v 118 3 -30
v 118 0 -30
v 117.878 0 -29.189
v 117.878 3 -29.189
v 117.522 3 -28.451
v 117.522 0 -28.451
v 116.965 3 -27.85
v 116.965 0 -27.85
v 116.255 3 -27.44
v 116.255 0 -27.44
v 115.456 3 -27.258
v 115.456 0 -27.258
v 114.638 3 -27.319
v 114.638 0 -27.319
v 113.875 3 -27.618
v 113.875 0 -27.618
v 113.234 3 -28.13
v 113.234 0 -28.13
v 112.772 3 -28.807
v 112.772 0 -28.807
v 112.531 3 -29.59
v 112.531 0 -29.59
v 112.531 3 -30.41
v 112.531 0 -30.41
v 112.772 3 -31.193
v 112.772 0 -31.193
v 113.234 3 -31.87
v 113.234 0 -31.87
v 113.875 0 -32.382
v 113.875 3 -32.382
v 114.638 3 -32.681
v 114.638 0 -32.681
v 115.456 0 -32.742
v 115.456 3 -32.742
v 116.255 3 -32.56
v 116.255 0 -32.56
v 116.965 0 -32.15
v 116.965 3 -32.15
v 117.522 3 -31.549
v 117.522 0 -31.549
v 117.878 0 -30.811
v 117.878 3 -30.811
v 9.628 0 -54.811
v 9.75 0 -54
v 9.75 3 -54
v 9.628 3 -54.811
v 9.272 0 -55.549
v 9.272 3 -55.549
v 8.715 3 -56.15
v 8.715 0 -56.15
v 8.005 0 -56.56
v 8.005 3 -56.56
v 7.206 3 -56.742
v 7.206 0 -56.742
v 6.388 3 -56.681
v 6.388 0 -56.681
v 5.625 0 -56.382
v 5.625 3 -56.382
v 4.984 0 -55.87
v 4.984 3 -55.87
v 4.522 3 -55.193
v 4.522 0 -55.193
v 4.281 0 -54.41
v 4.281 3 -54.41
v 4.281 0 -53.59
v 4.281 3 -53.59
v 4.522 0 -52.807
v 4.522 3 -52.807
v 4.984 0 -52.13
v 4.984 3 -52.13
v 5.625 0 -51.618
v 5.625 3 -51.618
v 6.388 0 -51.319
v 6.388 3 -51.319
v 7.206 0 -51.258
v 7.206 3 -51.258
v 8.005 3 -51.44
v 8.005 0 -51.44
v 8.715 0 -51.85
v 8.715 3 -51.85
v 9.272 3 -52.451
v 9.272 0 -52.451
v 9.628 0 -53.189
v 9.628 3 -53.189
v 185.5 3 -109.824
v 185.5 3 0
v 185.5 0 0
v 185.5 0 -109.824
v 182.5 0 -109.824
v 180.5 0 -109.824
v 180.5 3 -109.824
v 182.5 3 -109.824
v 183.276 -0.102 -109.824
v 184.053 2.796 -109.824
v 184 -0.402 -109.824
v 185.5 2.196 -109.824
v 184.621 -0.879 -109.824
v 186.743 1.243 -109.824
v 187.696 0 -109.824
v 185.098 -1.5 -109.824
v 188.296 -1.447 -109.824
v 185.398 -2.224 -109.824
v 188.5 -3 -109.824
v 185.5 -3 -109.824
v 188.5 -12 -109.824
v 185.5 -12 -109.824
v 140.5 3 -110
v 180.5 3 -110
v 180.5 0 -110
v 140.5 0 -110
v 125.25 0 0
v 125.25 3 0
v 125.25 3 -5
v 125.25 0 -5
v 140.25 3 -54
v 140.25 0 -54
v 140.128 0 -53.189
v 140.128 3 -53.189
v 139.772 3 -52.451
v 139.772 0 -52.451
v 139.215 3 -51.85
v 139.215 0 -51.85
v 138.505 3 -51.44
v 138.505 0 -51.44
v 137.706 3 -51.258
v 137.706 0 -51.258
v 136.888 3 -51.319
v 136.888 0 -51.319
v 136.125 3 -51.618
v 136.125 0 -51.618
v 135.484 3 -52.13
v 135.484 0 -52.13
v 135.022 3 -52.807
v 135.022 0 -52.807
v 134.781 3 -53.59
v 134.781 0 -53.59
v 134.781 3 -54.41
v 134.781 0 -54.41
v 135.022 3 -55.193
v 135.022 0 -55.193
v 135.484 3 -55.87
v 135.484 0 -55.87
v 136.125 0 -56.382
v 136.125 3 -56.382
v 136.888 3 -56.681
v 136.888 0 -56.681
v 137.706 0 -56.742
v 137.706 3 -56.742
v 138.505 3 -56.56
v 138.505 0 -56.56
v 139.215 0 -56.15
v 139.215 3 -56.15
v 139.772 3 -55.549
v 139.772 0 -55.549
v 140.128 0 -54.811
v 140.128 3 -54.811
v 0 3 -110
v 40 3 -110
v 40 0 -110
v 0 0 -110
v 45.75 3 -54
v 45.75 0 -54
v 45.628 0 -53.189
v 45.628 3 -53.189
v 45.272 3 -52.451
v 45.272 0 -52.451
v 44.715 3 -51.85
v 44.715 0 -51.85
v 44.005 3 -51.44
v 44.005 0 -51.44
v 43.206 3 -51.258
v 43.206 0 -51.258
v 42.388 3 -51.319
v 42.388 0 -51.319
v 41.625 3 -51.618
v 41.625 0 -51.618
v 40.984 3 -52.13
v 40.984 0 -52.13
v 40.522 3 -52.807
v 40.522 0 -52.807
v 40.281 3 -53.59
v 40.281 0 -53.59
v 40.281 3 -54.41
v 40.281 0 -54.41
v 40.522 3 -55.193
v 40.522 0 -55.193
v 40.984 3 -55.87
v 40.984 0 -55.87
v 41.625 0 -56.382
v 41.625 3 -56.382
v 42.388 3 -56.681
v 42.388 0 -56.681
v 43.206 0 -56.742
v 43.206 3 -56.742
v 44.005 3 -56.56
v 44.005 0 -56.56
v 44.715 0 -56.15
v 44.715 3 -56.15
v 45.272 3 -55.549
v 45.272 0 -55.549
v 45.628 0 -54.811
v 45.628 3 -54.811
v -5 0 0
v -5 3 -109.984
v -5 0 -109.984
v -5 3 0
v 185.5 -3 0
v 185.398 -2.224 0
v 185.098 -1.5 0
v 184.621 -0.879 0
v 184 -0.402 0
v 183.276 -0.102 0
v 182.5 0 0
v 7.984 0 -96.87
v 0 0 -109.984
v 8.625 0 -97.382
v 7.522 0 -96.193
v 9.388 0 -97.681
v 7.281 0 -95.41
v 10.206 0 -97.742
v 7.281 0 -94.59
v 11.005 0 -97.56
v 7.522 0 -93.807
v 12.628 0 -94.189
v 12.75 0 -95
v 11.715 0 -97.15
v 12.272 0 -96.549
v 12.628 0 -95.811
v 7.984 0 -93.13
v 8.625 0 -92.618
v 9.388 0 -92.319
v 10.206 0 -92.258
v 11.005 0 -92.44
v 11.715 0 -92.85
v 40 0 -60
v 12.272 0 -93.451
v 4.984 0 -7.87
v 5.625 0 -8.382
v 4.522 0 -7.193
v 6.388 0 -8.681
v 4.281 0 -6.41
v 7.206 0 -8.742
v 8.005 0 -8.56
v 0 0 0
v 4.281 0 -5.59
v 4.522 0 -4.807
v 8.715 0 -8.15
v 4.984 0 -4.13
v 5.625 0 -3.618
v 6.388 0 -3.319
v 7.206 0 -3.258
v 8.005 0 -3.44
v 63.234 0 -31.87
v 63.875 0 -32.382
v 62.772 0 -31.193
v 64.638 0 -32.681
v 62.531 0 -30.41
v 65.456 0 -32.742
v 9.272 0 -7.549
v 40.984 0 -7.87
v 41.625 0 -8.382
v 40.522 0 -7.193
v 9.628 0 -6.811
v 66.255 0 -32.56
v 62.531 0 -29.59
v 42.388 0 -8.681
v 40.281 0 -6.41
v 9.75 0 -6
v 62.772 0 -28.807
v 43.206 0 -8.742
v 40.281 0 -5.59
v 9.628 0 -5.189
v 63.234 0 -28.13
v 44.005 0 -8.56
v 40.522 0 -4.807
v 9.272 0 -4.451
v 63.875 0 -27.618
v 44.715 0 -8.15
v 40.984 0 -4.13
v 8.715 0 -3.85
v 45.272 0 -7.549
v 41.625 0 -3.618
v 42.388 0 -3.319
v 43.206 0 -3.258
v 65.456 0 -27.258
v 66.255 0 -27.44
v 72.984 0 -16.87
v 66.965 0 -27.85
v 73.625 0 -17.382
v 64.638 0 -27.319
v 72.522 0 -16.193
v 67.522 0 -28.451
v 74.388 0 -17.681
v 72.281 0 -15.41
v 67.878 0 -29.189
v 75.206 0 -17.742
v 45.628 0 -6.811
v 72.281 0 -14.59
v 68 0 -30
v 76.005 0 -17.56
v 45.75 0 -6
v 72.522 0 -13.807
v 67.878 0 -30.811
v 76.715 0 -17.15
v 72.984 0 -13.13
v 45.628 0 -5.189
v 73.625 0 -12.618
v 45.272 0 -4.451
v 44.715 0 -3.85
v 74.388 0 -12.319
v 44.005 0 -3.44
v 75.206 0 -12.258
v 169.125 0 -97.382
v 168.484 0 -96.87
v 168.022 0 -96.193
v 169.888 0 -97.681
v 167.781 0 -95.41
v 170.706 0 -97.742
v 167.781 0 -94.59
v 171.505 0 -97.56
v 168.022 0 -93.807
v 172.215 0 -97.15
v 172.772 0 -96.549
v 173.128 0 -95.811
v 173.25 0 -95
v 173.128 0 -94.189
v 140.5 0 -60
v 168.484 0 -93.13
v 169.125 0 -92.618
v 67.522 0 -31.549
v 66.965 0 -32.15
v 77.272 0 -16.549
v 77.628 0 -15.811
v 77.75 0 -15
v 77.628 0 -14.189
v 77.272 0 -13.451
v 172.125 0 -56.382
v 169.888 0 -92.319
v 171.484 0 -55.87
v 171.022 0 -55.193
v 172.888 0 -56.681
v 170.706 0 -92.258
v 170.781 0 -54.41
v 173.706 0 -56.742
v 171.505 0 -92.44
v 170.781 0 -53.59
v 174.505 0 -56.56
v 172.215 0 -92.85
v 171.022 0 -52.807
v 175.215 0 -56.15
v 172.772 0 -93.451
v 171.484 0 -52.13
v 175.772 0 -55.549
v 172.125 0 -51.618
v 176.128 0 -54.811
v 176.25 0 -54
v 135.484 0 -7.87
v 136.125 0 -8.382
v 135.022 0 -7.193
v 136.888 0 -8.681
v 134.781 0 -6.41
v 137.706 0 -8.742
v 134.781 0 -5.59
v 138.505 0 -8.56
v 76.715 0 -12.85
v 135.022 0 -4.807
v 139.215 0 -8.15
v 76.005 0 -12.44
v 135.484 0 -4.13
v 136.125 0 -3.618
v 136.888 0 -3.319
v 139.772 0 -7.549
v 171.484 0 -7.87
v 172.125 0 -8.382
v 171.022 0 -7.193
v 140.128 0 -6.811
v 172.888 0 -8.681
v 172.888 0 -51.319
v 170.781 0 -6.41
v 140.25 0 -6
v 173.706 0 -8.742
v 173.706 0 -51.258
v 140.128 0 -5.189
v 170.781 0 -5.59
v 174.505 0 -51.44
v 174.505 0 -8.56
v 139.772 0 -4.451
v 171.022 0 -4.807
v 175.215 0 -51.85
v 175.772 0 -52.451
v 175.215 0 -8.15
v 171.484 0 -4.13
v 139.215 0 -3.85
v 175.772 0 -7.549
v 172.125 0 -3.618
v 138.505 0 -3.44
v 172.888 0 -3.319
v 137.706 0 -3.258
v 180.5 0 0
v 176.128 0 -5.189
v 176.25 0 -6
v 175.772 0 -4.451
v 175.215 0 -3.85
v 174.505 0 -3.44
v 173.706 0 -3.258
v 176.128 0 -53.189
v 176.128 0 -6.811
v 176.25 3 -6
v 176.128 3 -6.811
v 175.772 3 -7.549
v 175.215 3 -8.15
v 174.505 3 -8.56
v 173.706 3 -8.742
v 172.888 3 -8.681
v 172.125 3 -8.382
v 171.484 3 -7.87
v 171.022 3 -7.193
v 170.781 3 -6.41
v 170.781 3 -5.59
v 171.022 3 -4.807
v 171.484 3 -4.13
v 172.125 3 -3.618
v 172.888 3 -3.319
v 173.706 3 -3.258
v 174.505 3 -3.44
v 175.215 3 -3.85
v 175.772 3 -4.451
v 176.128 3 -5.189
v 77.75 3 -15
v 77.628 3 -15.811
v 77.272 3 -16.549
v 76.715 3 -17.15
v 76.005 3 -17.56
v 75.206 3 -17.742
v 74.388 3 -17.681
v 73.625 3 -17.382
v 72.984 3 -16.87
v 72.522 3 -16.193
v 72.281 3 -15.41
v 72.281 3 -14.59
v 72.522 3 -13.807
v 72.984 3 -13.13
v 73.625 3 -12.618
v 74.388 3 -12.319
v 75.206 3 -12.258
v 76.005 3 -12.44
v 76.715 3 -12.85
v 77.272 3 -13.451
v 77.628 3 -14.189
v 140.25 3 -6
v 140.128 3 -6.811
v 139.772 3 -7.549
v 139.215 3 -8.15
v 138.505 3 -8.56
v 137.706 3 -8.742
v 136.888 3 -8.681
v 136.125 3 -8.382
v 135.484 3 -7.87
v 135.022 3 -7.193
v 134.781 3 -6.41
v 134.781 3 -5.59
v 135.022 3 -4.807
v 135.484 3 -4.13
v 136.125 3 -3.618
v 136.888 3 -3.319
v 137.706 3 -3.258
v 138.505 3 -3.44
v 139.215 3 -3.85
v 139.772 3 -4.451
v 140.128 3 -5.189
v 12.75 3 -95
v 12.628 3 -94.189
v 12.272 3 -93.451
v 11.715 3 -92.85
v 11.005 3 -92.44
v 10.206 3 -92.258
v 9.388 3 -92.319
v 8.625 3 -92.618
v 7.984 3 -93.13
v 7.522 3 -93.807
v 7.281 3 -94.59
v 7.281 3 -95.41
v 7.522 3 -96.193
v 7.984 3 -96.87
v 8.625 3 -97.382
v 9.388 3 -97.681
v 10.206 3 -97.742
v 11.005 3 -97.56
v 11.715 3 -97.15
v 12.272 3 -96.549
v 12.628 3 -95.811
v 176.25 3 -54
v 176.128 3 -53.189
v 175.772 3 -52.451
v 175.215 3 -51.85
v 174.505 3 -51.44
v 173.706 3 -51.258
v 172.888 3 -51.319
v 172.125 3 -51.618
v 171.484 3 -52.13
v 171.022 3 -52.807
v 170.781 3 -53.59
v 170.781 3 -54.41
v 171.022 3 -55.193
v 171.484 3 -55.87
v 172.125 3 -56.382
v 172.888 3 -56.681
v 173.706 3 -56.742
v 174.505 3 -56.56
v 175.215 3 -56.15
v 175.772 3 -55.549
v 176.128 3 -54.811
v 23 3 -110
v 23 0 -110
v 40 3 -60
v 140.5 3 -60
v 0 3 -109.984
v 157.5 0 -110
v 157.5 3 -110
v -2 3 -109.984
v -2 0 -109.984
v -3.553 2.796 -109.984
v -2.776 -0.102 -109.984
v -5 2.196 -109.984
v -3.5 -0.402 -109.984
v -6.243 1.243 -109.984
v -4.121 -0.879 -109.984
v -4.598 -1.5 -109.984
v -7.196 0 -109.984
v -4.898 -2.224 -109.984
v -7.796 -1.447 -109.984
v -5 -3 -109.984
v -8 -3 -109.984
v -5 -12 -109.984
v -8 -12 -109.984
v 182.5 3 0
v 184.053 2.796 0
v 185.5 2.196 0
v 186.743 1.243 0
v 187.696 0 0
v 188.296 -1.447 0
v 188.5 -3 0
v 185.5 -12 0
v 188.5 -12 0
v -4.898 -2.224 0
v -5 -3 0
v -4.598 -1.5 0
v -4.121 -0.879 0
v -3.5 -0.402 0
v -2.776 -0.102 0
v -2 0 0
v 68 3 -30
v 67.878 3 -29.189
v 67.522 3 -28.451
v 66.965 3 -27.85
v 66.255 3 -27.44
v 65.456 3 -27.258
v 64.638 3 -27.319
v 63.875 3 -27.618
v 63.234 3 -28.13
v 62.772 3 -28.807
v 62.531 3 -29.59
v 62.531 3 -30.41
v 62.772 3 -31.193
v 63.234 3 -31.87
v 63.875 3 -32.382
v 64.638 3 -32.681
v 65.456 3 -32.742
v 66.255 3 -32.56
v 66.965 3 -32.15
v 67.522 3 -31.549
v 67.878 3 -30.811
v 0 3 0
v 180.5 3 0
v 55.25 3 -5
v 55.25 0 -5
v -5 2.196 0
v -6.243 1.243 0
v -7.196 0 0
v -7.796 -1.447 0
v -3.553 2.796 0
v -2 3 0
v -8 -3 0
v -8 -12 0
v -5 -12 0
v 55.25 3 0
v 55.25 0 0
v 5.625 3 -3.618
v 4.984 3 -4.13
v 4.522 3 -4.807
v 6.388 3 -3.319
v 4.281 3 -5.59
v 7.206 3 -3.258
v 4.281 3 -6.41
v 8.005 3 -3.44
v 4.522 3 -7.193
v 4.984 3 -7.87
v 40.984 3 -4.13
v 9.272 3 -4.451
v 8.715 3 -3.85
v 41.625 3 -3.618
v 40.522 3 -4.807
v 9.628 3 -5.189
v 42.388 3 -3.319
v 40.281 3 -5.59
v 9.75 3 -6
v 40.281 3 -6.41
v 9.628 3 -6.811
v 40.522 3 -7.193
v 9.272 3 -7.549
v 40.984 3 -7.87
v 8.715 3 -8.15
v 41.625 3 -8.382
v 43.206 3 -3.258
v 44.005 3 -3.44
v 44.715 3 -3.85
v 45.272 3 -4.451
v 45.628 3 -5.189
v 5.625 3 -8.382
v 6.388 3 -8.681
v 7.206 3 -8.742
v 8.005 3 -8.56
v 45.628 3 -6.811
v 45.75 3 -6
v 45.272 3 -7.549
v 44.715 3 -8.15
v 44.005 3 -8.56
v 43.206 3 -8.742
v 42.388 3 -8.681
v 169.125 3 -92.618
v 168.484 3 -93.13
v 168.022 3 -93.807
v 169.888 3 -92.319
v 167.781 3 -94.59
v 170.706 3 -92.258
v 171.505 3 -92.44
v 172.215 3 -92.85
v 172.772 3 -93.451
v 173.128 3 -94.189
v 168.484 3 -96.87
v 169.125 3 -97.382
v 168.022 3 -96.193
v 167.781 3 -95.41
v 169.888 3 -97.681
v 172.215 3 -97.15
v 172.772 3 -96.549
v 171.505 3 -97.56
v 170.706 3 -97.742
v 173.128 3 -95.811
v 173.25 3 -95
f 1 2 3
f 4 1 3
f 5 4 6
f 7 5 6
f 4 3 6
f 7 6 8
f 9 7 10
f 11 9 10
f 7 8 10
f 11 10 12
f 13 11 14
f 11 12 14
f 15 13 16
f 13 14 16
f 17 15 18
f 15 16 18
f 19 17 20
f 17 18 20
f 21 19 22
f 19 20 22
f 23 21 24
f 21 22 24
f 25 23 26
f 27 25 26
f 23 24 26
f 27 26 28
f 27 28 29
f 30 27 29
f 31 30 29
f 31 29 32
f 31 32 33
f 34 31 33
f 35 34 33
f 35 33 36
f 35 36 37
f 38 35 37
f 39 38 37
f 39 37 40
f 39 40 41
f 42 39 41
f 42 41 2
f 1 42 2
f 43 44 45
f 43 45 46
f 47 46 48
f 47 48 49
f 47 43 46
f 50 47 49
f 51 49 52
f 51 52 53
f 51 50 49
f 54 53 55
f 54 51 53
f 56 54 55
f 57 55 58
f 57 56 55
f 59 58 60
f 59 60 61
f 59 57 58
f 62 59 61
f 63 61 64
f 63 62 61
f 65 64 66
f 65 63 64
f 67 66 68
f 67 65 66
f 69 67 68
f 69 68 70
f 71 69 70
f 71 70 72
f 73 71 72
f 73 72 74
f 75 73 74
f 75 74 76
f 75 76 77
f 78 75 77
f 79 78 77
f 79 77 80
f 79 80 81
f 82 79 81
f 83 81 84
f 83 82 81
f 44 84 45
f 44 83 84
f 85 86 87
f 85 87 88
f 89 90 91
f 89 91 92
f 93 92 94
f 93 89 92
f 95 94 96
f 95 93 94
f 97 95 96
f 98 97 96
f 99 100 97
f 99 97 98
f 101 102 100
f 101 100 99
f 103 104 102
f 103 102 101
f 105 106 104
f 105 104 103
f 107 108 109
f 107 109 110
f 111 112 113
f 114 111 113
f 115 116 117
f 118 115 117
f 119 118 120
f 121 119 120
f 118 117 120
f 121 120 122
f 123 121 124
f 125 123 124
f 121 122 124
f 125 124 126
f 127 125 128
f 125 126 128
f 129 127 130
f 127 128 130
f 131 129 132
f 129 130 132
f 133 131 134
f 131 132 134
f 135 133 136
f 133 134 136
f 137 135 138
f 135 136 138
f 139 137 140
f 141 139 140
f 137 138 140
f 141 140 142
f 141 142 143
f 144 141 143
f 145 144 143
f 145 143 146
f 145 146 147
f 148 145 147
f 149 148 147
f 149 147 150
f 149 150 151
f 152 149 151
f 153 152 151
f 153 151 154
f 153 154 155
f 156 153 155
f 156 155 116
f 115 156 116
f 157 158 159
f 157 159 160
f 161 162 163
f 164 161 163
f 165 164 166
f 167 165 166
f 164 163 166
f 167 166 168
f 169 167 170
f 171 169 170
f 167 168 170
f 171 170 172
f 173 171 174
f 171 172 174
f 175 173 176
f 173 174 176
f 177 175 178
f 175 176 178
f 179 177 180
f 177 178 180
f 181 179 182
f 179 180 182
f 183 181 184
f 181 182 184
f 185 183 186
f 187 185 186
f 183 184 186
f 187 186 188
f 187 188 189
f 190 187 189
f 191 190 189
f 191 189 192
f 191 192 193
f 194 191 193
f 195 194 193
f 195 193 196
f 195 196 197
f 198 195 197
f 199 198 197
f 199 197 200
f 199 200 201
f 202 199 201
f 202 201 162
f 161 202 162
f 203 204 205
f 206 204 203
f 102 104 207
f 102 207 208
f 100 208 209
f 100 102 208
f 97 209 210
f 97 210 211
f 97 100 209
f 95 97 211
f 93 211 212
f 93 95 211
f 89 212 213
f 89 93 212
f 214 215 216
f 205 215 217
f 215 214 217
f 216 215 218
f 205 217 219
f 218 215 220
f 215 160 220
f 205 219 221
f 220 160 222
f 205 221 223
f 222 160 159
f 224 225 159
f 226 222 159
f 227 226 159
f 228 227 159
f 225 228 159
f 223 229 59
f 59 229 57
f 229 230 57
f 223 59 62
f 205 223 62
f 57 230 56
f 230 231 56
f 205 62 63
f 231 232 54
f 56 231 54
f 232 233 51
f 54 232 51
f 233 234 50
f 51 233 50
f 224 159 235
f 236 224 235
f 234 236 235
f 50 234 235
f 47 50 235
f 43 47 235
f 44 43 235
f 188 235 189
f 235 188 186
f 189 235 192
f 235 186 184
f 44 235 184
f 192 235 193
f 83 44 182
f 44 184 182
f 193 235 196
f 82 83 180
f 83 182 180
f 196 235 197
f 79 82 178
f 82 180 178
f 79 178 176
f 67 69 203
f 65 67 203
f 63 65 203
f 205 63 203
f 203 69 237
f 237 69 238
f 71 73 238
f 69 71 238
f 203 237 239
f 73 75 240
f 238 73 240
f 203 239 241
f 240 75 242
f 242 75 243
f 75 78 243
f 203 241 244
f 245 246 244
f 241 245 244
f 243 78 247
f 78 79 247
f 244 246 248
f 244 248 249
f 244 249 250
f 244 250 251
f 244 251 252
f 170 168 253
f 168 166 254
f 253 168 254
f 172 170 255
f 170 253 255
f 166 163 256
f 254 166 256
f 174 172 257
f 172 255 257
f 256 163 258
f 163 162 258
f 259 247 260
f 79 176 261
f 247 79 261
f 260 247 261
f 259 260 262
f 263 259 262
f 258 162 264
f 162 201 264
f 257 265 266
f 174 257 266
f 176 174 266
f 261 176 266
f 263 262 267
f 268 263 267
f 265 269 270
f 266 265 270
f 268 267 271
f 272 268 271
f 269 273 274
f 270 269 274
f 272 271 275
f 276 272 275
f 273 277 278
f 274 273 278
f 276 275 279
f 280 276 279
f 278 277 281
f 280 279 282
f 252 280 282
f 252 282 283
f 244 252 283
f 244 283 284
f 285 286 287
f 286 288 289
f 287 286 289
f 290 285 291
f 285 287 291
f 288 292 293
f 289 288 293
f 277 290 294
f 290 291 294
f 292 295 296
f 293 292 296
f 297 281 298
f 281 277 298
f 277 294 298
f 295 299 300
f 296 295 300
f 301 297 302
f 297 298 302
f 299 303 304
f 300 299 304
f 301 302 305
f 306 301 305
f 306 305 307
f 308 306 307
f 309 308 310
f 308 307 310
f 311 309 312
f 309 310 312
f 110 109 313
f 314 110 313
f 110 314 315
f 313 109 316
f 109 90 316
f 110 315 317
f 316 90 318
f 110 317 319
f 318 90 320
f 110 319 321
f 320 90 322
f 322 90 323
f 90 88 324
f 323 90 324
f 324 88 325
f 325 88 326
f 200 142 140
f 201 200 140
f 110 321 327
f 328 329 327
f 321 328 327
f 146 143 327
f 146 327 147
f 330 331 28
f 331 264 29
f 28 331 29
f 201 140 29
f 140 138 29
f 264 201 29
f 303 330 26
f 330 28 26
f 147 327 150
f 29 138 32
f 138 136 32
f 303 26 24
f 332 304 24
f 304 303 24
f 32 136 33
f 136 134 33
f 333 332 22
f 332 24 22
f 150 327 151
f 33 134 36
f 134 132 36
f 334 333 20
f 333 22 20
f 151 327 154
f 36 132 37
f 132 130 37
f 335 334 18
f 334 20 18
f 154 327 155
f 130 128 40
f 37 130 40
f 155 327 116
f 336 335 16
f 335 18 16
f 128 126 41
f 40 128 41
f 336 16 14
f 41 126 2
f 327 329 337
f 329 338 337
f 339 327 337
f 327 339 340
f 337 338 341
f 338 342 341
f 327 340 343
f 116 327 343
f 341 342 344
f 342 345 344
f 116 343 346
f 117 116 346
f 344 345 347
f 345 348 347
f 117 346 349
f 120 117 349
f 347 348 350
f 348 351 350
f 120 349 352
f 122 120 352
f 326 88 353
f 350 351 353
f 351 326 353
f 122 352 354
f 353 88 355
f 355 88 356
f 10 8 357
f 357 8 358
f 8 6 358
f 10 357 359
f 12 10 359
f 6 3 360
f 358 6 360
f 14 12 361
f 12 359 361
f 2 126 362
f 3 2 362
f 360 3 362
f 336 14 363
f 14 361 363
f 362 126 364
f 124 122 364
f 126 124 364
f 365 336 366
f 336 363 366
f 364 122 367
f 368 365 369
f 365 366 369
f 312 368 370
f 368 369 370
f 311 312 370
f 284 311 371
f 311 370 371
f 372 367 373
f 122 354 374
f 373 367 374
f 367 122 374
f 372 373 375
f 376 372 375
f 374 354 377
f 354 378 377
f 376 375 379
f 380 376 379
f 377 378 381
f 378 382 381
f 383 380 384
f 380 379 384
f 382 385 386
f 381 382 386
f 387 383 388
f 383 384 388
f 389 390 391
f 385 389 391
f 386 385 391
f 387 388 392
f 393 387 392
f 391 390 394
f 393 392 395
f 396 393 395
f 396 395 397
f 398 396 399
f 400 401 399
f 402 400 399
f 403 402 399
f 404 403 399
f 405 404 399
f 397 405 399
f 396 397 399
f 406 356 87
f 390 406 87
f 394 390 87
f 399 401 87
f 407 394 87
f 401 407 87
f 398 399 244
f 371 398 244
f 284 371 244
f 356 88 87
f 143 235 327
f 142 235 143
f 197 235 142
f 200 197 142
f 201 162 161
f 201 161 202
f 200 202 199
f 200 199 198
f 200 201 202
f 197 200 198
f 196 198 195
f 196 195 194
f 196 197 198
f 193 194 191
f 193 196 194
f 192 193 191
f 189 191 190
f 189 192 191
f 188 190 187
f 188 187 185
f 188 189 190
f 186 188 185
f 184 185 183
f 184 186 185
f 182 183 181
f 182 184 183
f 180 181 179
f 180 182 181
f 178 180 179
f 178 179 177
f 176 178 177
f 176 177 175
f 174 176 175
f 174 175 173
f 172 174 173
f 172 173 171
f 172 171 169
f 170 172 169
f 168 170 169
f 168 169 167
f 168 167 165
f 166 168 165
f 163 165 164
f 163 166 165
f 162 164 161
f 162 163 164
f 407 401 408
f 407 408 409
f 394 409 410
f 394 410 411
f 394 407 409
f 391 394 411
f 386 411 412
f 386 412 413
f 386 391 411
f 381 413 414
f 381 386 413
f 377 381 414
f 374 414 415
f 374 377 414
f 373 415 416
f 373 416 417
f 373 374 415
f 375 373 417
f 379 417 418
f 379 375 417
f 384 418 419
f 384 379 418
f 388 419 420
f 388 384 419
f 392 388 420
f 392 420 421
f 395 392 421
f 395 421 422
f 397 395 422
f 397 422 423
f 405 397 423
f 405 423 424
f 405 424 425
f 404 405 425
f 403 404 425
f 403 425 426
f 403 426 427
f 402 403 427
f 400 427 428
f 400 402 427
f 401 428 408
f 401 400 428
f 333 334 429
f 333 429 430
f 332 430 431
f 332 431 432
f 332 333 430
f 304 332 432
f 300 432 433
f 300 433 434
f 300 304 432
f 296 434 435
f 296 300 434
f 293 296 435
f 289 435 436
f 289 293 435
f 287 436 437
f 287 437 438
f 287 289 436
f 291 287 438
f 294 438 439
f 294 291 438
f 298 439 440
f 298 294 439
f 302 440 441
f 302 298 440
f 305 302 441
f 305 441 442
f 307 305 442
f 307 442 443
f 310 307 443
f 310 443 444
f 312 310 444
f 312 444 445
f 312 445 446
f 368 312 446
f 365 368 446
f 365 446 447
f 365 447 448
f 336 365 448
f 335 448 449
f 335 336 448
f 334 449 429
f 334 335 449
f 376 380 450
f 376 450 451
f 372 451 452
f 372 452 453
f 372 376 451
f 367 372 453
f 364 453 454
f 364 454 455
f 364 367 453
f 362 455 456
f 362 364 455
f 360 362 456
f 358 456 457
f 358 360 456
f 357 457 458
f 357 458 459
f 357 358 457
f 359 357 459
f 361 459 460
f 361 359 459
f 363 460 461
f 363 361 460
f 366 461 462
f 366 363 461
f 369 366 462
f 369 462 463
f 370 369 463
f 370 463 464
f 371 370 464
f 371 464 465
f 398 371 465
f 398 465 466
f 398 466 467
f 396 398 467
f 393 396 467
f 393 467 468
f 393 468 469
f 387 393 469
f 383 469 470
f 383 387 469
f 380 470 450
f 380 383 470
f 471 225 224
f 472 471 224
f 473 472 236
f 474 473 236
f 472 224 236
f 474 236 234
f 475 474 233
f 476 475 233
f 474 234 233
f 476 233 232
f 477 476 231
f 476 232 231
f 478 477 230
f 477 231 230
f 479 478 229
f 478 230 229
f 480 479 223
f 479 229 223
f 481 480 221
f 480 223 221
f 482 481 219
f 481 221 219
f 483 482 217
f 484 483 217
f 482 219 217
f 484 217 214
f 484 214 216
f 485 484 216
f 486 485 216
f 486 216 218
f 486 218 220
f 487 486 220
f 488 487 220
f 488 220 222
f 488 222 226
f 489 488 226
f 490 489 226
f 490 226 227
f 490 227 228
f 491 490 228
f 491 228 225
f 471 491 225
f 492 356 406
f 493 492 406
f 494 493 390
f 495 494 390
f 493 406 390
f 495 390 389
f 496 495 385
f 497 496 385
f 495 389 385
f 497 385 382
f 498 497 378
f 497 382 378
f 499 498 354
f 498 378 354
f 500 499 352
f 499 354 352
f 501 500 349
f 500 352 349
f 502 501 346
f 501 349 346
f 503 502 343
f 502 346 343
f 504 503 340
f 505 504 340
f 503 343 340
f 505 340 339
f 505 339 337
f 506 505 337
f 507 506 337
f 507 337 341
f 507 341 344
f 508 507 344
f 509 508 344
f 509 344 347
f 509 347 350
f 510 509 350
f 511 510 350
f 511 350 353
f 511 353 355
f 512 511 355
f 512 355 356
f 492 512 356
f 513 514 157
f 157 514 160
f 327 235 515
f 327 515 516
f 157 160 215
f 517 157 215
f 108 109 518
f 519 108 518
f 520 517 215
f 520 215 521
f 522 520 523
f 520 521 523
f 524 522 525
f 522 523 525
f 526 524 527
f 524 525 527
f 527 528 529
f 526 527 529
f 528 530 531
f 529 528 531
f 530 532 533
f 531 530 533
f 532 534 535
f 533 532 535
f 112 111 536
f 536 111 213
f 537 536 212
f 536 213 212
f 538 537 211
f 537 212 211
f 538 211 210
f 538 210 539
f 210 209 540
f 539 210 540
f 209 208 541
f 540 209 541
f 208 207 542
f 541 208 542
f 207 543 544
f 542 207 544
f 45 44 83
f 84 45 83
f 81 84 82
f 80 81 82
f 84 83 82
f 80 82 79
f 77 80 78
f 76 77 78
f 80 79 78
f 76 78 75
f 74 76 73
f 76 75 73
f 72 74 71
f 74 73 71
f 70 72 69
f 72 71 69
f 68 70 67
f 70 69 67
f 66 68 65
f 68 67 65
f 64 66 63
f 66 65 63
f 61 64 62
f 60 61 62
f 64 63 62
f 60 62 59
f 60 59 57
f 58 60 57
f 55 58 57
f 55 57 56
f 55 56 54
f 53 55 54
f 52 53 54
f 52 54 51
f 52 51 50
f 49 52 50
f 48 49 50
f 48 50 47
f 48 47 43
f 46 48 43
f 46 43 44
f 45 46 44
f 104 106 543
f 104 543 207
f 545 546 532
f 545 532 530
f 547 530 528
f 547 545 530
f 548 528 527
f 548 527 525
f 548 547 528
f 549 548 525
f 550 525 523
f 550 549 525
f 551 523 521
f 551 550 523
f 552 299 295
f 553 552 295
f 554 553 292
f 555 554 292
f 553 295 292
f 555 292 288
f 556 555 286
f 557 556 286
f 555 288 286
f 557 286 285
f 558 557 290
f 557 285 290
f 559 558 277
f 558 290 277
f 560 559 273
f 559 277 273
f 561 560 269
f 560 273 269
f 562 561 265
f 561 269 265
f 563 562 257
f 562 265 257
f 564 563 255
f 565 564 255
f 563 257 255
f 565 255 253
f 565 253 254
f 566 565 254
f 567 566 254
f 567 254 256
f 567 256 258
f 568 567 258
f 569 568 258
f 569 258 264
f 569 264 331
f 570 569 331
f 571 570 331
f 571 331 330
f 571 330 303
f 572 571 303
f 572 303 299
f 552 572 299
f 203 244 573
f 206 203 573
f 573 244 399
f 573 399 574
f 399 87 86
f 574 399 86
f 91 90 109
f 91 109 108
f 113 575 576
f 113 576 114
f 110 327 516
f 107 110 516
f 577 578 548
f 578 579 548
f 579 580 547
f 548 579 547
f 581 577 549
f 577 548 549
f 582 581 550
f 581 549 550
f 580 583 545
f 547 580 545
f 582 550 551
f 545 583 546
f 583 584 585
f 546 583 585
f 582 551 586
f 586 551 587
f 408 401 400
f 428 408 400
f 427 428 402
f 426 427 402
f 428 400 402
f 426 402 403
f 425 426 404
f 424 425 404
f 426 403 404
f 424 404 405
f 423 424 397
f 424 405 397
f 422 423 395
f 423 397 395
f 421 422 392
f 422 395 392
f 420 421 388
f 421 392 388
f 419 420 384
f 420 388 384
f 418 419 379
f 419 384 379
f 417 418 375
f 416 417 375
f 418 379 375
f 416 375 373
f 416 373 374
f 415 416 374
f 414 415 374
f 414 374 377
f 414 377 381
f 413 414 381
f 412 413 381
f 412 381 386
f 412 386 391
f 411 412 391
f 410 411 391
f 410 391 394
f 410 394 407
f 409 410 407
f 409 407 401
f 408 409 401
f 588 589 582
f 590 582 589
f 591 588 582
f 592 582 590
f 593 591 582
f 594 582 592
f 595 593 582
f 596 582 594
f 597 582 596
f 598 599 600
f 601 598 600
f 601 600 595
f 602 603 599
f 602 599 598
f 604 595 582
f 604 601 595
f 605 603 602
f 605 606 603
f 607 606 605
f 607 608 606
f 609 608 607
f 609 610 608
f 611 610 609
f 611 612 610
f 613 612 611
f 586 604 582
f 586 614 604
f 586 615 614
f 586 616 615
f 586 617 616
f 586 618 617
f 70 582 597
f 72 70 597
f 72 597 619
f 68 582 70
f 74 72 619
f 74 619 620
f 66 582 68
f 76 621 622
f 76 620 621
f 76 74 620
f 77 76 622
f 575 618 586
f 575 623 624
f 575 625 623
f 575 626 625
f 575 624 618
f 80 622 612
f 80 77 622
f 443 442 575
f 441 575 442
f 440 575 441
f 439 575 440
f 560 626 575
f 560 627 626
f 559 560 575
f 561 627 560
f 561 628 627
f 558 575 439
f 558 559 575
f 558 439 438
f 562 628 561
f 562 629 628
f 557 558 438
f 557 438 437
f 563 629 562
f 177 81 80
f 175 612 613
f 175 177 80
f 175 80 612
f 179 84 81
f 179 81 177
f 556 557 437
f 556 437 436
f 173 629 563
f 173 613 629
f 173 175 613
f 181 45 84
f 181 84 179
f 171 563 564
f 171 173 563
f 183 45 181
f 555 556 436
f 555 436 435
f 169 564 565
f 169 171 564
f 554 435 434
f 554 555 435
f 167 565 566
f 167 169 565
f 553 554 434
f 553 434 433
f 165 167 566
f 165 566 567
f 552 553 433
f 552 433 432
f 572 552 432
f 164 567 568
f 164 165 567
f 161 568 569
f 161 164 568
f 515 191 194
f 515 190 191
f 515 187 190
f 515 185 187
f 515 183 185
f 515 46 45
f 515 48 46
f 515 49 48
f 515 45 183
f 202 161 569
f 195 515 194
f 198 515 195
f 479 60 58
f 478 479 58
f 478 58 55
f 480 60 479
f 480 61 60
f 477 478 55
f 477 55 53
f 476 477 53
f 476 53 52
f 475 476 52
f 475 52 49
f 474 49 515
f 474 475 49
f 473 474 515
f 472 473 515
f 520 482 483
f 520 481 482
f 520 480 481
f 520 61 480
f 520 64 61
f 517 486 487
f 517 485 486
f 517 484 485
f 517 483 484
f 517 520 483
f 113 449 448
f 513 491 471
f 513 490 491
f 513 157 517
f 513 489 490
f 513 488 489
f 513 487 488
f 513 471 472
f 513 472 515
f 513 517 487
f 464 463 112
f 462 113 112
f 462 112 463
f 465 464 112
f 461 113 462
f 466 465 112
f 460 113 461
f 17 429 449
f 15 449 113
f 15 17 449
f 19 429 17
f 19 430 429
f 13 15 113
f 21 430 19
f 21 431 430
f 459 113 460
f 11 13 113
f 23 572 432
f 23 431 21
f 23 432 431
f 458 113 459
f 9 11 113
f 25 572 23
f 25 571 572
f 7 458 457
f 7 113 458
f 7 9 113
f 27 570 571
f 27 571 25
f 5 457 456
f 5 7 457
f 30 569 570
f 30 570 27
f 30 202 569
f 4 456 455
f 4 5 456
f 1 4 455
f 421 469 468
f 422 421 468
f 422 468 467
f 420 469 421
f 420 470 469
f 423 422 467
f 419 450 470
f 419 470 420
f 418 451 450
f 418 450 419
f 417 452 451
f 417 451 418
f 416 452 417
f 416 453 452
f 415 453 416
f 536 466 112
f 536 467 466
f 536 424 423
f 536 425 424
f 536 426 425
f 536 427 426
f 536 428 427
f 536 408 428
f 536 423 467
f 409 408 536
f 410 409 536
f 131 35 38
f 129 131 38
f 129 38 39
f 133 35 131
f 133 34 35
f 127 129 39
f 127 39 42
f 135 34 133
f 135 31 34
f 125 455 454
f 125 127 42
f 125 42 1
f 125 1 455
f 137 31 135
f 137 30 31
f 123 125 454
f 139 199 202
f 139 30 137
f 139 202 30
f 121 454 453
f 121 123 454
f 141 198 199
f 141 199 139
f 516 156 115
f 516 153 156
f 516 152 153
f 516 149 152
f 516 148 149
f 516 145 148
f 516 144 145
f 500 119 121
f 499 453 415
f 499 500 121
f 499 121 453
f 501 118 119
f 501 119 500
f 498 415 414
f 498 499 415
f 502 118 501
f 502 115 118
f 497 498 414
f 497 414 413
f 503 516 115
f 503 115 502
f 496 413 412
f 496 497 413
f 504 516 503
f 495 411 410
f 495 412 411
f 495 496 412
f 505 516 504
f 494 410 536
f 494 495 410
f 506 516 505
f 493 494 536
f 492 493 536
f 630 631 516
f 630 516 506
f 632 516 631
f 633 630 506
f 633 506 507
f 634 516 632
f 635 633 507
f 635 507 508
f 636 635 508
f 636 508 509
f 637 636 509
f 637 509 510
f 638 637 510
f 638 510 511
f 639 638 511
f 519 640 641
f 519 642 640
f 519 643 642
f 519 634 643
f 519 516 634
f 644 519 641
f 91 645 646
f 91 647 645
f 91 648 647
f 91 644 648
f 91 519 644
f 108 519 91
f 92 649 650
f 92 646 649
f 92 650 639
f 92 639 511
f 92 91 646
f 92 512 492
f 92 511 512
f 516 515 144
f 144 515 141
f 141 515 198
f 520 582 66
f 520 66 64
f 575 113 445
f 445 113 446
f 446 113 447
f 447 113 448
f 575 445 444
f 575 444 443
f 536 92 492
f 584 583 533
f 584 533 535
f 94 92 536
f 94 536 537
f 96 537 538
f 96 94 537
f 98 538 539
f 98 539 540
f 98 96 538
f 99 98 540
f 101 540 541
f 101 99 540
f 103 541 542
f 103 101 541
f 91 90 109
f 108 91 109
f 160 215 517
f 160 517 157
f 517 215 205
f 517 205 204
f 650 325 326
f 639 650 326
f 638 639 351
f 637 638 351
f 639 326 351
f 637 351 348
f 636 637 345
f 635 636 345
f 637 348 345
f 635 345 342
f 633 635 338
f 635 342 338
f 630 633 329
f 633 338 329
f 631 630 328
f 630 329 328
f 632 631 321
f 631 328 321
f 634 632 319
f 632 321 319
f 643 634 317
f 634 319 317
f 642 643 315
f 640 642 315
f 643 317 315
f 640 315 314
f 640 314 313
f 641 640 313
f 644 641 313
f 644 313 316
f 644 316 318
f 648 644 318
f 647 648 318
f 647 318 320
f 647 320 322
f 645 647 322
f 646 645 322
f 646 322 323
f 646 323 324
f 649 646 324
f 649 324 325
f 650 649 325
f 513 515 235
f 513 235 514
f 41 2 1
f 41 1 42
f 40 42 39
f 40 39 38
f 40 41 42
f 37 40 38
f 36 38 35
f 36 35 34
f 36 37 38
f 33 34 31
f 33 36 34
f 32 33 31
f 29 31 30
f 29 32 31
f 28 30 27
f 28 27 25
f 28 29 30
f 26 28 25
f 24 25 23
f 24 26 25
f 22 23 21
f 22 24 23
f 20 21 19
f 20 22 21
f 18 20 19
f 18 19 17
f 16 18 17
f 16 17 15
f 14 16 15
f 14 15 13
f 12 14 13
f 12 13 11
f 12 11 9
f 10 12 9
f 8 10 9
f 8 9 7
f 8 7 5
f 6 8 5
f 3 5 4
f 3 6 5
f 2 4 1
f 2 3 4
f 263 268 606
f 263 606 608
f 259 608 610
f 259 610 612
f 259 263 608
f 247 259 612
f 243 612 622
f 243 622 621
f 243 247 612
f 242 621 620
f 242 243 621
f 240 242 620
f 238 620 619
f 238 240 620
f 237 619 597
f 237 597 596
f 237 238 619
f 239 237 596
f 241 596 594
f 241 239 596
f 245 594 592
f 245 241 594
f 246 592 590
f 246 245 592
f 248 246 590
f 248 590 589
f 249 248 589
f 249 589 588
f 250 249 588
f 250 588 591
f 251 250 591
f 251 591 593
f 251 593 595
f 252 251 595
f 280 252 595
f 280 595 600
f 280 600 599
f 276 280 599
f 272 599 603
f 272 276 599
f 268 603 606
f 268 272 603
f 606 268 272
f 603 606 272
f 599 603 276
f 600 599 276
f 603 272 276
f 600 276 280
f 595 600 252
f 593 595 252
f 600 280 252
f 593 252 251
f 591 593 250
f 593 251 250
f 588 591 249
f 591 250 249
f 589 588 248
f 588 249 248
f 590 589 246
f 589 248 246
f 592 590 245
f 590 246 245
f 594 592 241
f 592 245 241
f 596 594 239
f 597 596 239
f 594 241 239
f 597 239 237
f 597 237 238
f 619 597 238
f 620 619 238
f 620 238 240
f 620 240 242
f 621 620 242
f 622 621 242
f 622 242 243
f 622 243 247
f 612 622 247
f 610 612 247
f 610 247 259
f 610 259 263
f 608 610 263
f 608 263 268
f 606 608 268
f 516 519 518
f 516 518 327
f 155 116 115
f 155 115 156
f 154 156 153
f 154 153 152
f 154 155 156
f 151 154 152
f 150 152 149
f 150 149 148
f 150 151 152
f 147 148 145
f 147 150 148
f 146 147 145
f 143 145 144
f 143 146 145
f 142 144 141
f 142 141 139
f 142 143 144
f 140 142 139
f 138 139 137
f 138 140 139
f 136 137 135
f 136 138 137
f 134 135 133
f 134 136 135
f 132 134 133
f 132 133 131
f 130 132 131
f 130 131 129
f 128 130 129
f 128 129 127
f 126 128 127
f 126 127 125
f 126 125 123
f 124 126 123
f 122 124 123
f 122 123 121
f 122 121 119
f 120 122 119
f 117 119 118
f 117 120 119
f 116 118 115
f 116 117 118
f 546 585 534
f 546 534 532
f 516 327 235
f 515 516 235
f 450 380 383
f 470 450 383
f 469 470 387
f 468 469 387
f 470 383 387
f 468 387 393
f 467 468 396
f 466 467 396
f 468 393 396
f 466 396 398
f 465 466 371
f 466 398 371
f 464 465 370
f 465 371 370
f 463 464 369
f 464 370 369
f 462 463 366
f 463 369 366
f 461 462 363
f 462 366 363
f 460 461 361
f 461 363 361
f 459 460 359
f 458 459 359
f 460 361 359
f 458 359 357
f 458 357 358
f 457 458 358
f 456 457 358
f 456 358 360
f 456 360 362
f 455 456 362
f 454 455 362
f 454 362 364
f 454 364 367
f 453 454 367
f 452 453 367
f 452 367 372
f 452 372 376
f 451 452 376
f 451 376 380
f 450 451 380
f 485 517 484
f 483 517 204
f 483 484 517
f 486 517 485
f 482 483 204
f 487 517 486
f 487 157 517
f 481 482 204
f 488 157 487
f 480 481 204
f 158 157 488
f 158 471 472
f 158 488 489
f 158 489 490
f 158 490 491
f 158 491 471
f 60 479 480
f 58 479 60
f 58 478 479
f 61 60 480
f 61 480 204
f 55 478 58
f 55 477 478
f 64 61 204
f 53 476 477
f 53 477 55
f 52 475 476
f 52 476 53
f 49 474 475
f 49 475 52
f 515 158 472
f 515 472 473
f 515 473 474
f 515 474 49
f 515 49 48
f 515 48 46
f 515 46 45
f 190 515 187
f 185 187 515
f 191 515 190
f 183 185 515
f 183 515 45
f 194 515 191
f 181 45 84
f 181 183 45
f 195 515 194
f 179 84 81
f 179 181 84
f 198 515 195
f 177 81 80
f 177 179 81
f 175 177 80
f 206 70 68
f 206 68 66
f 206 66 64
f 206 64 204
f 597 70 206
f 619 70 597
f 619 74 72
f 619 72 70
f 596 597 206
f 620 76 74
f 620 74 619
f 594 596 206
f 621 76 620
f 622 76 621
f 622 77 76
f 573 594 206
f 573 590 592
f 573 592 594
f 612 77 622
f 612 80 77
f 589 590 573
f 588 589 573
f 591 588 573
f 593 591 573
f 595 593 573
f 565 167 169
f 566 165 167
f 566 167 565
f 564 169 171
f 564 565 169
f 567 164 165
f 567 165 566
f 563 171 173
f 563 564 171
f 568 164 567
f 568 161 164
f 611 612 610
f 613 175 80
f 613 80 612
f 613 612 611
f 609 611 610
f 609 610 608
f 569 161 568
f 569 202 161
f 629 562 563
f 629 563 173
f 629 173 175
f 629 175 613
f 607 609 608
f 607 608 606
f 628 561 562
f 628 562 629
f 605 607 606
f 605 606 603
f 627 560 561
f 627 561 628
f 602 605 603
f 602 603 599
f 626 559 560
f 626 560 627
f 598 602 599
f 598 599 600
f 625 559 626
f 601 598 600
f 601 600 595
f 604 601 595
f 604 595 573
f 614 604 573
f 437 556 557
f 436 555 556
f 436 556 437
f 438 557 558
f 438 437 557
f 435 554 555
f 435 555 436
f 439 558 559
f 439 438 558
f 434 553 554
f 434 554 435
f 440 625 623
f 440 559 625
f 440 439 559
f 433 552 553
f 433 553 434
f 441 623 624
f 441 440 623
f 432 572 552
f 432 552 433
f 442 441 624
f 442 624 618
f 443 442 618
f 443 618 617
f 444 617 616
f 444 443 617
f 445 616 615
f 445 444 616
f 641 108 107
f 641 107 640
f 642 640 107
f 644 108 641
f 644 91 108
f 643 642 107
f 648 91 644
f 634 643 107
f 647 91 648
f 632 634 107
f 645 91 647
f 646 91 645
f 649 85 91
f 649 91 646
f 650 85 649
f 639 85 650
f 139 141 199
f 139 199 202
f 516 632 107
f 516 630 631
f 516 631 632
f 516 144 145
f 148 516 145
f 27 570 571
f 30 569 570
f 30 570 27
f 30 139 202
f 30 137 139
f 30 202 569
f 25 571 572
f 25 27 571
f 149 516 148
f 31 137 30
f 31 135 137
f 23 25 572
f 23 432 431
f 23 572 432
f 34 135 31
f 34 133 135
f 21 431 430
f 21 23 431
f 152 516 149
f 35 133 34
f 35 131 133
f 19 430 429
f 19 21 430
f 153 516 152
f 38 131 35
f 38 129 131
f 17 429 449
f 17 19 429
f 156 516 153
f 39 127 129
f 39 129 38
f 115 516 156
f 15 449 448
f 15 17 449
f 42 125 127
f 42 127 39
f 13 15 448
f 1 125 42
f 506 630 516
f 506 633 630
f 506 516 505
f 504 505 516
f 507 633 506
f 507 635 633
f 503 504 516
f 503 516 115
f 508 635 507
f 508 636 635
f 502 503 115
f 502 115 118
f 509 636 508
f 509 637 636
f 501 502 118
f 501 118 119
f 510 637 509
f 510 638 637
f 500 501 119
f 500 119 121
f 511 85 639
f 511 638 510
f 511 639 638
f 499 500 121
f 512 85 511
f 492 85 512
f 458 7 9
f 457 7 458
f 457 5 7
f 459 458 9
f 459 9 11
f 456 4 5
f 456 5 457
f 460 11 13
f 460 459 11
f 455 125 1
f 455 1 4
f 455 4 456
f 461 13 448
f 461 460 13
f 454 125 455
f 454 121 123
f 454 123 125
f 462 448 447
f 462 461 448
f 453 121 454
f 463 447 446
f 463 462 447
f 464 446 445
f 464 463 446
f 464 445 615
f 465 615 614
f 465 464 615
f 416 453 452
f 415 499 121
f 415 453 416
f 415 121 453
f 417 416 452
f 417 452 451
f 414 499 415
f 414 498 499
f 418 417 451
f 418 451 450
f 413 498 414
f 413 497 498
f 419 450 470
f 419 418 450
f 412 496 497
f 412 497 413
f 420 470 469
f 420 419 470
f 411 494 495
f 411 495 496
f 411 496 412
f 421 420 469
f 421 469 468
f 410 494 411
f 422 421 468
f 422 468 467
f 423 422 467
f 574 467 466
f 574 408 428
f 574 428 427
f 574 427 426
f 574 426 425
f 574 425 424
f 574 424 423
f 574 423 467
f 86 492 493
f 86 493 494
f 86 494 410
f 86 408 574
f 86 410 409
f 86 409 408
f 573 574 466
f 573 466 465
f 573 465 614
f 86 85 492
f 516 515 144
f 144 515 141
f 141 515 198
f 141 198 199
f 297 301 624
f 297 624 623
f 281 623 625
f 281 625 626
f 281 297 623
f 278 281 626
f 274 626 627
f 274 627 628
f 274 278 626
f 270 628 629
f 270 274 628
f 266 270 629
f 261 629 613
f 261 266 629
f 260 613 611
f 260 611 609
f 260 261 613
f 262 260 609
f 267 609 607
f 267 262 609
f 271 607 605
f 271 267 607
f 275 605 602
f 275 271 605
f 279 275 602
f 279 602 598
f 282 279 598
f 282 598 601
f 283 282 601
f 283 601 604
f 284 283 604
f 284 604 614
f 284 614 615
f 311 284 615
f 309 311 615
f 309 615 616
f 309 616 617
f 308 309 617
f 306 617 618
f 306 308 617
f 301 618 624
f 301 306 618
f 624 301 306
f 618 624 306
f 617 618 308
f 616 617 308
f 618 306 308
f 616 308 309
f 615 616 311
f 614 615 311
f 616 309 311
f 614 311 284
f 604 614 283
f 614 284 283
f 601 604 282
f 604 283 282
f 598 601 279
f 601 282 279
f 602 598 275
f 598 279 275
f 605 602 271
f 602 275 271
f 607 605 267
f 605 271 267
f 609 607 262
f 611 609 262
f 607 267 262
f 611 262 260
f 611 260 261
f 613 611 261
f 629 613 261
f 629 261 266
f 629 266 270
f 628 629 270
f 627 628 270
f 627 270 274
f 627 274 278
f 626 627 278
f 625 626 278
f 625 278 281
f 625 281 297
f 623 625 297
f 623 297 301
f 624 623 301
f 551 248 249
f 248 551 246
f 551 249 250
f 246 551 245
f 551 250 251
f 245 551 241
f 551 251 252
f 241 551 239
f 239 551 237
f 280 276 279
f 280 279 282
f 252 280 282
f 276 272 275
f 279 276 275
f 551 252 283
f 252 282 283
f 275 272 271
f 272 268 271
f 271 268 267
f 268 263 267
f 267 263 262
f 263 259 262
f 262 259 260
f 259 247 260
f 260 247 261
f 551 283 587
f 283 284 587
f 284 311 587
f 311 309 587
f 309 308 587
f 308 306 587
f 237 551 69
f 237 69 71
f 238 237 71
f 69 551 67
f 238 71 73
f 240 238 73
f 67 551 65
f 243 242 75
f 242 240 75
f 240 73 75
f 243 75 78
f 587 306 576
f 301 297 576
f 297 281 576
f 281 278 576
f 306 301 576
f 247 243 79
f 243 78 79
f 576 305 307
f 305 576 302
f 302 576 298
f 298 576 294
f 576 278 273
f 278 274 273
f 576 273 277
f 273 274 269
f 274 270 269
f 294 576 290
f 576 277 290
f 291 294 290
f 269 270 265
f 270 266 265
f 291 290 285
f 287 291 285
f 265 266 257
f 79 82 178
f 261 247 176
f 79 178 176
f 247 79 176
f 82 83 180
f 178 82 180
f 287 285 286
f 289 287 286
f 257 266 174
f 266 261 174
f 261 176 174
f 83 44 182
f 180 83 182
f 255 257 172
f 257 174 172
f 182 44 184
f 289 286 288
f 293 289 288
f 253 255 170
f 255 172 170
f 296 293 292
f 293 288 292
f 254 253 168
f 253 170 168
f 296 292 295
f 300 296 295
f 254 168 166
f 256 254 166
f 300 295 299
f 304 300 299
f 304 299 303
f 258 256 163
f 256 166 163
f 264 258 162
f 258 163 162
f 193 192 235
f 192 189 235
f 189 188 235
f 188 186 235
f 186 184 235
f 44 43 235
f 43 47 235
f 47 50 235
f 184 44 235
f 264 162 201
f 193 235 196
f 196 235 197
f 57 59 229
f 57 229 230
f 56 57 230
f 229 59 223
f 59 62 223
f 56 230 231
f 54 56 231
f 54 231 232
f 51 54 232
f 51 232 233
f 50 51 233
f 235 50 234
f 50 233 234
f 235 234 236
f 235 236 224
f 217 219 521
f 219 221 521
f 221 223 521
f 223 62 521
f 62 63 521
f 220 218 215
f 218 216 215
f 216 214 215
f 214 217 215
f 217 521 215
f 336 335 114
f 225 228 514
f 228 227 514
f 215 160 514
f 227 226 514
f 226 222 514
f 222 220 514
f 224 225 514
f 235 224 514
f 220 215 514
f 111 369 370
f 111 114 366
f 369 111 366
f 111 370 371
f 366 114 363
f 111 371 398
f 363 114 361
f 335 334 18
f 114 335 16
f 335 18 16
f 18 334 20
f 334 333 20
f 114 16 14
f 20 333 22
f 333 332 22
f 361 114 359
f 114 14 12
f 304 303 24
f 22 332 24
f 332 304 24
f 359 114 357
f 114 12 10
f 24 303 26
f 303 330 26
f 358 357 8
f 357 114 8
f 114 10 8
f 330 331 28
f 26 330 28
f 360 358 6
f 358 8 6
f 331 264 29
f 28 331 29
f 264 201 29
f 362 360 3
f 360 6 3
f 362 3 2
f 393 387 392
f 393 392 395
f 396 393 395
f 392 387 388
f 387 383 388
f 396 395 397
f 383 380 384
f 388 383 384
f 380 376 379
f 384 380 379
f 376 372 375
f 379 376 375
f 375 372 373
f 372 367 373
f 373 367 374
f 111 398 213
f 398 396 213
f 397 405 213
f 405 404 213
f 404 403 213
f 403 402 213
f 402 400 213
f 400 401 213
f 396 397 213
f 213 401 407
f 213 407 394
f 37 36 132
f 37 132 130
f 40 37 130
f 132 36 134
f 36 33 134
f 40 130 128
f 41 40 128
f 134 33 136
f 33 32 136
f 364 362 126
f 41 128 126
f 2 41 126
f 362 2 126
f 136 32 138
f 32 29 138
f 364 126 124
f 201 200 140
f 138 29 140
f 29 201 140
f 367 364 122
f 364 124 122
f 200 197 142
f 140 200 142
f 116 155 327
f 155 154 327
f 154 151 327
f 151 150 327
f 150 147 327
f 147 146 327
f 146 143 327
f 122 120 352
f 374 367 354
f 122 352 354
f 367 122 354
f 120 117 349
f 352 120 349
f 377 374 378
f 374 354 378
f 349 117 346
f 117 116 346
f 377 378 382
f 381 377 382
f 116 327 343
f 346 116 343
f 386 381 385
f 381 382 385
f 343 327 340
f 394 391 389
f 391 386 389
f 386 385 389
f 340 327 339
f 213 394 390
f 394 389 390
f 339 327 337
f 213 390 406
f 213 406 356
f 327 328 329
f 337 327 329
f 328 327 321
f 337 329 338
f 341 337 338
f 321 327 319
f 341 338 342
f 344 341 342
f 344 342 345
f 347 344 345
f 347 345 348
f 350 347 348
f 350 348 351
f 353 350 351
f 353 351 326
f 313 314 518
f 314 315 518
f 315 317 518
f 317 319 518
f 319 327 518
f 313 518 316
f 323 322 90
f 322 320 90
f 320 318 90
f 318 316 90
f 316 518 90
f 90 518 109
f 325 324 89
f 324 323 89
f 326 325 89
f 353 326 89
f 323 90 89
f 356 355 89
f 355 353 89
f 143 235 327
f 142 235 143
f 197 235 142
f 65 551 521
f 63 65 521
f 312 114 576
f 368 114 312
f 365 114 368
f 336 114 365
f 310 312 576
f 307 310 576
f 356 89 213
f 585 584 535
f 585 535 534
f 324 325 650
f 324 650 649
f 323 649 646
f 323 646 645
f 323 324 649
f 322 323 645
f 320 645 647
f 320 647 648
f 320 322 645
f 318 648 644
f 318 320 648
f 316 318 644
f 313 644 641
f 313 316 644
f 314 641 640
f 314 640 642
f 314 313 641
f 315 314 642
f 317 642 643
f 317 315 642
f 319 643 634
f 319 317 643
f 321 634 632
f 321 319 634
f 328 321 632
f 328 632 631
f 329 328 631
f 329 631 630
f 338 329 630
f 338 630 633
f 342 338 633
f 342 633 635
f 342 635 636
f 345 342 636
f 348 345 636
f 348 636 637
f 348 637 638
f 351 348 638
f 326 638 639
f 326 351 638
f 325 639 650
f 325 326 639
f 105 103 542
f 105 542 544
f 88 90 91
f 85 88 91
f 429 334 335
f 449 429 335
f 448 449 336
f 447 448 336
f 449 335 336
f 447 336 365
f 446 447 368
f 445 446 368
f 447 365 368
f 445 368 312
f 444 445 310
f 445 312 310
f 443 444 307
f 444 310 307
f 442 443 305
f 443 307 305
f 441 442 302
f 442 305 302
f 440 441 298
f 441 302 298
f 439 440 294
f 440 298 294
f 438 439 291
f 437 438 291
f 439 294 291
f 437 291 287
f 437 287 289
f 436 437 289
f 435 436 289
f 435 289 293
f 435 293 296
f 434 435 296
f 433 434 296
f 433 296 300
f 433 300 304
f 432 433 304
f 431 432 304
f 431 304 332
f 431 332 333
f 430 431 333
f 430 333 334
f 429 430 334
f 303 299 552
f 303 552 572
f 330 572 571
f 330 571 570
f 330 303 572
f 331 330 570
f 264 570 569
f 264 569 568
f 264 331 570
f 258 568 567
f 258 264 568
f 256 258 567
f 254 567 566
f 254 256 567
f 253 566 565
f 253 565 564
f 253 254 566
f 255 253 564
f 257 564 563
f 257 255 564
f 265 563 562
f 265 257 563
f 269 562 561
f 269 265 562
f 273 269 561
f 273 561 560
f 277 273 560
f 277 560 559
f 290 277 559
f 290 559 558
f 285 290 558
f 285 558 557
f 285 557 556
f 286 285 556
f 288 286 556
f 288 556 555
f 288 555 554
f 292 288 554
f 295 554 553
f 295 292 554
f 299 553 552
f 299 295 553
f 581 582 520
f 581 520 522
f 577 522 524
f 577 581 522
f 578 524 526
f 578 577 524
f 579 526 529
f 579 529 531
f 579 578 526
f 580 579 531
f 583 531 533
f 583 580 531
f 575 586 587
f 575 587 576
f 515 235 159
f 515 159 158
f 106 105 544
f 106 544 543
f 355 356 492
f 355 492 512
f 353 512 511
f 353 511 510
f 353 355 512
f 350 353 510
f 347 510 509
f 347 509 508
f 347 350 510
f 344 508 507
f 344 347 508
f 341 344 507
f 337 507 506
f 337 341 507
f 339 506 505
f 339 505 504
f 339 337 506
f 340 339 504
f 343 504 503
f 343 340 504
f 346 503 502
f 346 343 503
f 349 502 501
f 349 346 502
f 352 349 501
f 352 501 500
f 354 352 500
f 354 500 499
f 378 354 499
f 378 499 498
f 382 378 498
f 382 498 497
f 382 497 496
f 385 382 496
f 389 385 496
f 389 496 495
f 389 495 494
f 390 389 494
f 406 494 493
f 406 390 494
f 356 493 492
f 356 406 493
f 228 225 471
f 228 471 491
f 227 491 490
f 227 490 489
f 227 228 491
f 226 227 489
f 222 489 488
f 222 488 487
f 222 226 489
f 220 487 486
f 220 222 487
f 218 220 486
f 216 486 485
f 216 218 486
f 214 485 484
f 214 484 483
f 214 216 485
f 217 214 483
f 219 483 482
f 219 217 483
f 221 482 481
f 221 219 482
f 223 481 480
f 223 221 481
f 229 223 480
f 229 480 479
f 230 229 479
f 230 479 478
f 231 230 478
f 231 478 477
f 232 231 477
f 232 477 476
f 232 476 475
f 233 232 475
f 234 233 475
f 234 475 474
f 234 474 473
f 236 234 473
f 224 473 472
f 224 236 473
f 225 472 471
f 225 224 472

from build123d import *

# Parameters (mm, degrees)
SKETCH1_W                    = 180.5
SKETCH1_H                    = 60
BOSS_EXTRUDE1_DEPTH          = 3
F_5_5_5_5_DIAMETER_HOLE1_D   = 5.5
SKETCH4_W                    = 40
SKETCH4_H                    = 3
BOSS_EXTRUDE2_DEPTH          = 50
SKETCH5_W                    = 109.823812377
SKETCH5_H                    = 3
BOSS_EXTRUDE3_DEPTH          = 5
SKETCH6_W                    = 109.983538279
SKETCH6_H                    = 3
BOSS_EXTRUDE4_DEPTH          = 5
F_5_5_5_5_DIAMETER_HOLE2_D   = 5.5
CONVERT_SOLID2_OUTLINE_R     = 2.75
CONVERT_SOLID2_DEPTH         = 3
EDGE_FLANGE1_STRIP_W         = 18
EDGE_FLANGE1_STRIP_H         = 3
EDGE_FLANGE1_STRIP_CUT_DEPTH = 109.983538279
EDGE_FLANGE1_DEPTH           = 109.983538279
EDGE_FLANGE2_STRIP_W         = 18
EDGE_FLANGE2_STRIP_H         = 3
EDGE_FLANGE2_STRIP_CUT_DEPTH = 109.823812377
EDGE_FLANGE2_DEPTH           = 109.823812377
CUT_EXTRUDE1_DEPTH           = 219.762999614
SKETCH23_W                   = 70
SKETCH23_H                   = 5
CUT_EXTRUDE2_DEPTH           = 219.762999614


# Read off the part's stored shape, not the designer's step: Convert-Solid2
# Sheet-metal steps are written as plain solids
with BuildPart() as part:
    # Sketch1 → Boss-Extrude1 (new body)
    with BuildSketch(Plane(origin=(0, 0, 0), x_dir=(1, 0, 0), z_dir=(0, 1, 0))):
        with Locations((90.25, 30)):
            Rectangle(SKETCH1_W, SKETCH1_H)
    extrude(amount=BOSS_EXTRUDE1_DEPTH)

    # Ø5.5 (5.5) Diameter Hole1 (through all)
    with Locations(Plane(origin=(0, 3, 0), x_dir=(-1, 0, 0), z_dir=(0, 1, 0))):
        with Locations((-7, -6), (-43, -6), (-43, -54), (-7, -54), (-115.25, -30), (-137.5, -6), (-173.5, -6), (-173.5, -54), (-137.5, -54), (-65.25, -30)):
            Hole(F_5_5_5_5_DIAMETER_HOLE1_D / 2)

    # Sketch4 → Boss-Extrude2 (add)
    with BuildSketch(Plane(origin=(0, 0, -60), x_dir=(-1, 0, 0), z_dir=(0, 0, -1))):
        with Locations((-160.5, 1.5)):
            Rectangle(SKETCH4_W, SKETCH4_H)
        with Locations((-20, 1.5)):
            Rectangle(SKETCH4_W, SKETCH4_H)
    extrude(amount=BOSS_EXTRUDE2_DEPTH)

    # Sketch5 → Boss-Extrude3 (add)
    with BuildSketch(Plane(origin=(180.5, 0, 0), x_dir=(0, 0, -1), z_dir=(1, 0, 0))):
        with Locations((54.911906189, 1.5)):
            Rectangle(SKETCH5_W, SKETCH5_H)
    extrude(amount=BOSS_EXTRUDE3_DEPTH)

    # Sketch6 → Boss-Extrude4 (add)
    with BuildSketch(Plane.ZY):
        with Locations((-54.99176914, 1.5)):
            Rectangle(SKETCH6_W, SKETCH6_H)
    extrude(amount=BOSS_EXTRUDE4_DEPTH)

    # Ø5.5 (5.5) Diameter Hole2 (through all)
    with Locations(Plane(origin=(0, 3, 0), x_dir=(-1, 0, 0), z_dir=(0, 1, 0))):
        with Locations((-75, -15), (-10, -95), (-170.5, -95)):
            Hole(F_5_5_5_5_DIAMETER_HOLE2_D / 2)


with BuildPart() as body_2:
    # Convert-Solid2 outline → Convert-Solid2 (new body)
    with BuildSketch(Plane(origin=(0, 0, 0), x_dir=(1, 0, 0), z_dir=(0, 1, 0))):
        Polygon((0, 110), (0, 109.983538279), (-5, 109.983538279), (-5, 0), (185.5, 0), (185.5, 109.823812377), (180.5, 109.823812377), (180.5, 110), (140.5, 110), (140.5, 60), (40, 60), (40, 110), align=None)
        with Locations((7, 6)):
            Circle(CONVERT_SOLID2_OUTLINE_R, mode=Mode.SUBTRACT)
        with Locations((43, 6)):
            Circle(CONVERT_SOLID2_OUTLINE_R, mode=Mode.SUBTRACT)
        with Locations((75, 15)):
            Circle(CONVERT_SOLID2_OUTLINE_R, mode=Mode.SUBTRACT)
        with Locations((7, 54)):
            Circle(CONVERT_SOLID2_OUTLINE_R, mode=Mode.SUBTRACT)
        with Locations((65.25, 30)):
            Circle(CONVERT_SOLID2_OUTLINE_R, mode=Mode.SUBTRACT)
        with Locations((43, 54)):
            Circle(CONVERT_SOLID2_OUTLINE_R, mode=Mode.SUBTRACT)
        with Locations((137.5, 6)):
            Circle(CONVERT_SOLID2_OUTLINE_R, mode=Mode.SUBTRACT)
        with Locations((173.5, 6)):
            Circle(CONVERT_SOLID2_OUTLINE_R, mode=Mode.SUBTRACT)
        with Locations((115.25, 30)):
            Circle(CONVERT_SOLID2_OUTLINE_R, mode=Mode.SUBTRACT)
        with Locations((137.5, 54)):
            Circle(CONVERT_SOLID2_OUTLINE_R, mode=Mode.SUBTRACT)
        with Locations((173.5, 54)):
            Circle(CONVERT_SOLID2_OUTLINE_R, mode=Mode.SUBTRACT)
        with Locations((10, 95)):
            Circle(CONVERT_SOLID2_OUTLINE_R, mode=Mode.SUBTRACT)
        with Locations((170.5, 95)):
            Circle(CONVERT_SOLID2_OUTLINE_R, mode=Mode.SUBTRACT)
    extrude(amount=CONVERT_SOLID2_DEPTH)

    # Edge-Flange1 strip (across the edge) → Edge-Flange1 strip cut (cut)
    with BuildSketch(Plane(origin=(-5, 0, 0), x_dir=(1, 0, 0), z_dir=(0, 0, -1))):
        with Locations((-6, -1.5)):
            Rectangle(EDGE_FLANGE1_STRIP_W, EDGE_FLANGE1_STRIP_H)
    extrude(amount=EDGE_FLANGE1_STRIP_CUT_DEPTH, mode=Mode.SUBTRACT)

    # Edge-Flange1 section (across the edge) → Edge-Flange1 (add)
    with BuildSketch(Plane(origin=(-5, 0, 0), x_dir=(1, 0, 0), z_dir=(0, 0, -1))):
        with BuildLine():
            Line((-3, 3), (-3, 12))
            Line((-3, 12), (0, 12))
            Line((0, 12), (0, 3))
            ThreePointArc((0, 3), (0.878679656, 0.878679656), (3, 0))
            Line((3, 0), (3, -3))
            ThreePointArc((3, -3), (-1.242640687, -1.242640687), (-3, 3))
        make_face()
    extrude(amount=EDGE_FLANGE1_DEPTH)

    # Edge-Flange2 strip (across the edge) → Edge-Flange2 strip cut (cut)
    with BuildSketch(Plane(origin=(185.5, 0, -109.823812377), x_dir=(-1, 0, 0), z_dir=(0, 0, 1))):
        with Locations((-6, -1.5)):
            Rectangle(EDGE_FLANGE2_STRIP_W, EDGE_FLANGE2_STRIP_H)
    extrude(amount=EDGE_FLANGE2_STRIP_CUT_DEPTH, mode=Mode.SUBTRACT)

    # Edge-Flange2 section (across the edge) → Edge-Flange2 (add)
    with BuildSketch(Plane(origin=(185.5, 0, -109.823812377), x_dir=(-1, 0, 0), z_dir=(0, 0, 1))):
        with BuildLine():
            Line((-3, 3), (-3, 12))
            Line((-3, 12), (0, 12))
            Line((0, 12), (0, 3))
            ThreePointArc((0, 3), (0.878679656, 0.878679656), (3, 0))
            Line((3, 0), (3, -3))
            ThreePointArc((3, -3), (-1.242640687, -1.242640687), (-3, 3))
        make_face()
    extrude(amount=EDGE_FLANGE2_DEPTH)

    # Sketch22 → Cut-Extrude1 (cut, through all)
    with BuildSketch(Plane(origin=(0, 3, 0), x_dir=(1, 0, 0), z_dir=(0, 1, 0))):
        Polygon((40, 60), (23, 110), (40, 110), align=None)
        Polygon((140.5, 60), (140.5, 110), (157.5, 110), align=None)
    extrude(amount=-CUT_EXTRUDE1_DEPTH, mode=Mode.SUBTRACT)

    # Sketch23 → Cut-Extrude2 (cut, through all)
    with BuildSketch(Plane(origin=(0, 3, 0), x_dir=(1, 0, 0), z_dir=(0, 1, 0))):
        with Locations((90.25, 2.5)):
            Rectangle(SKETCH23_W, SKETCH23_H)
    extrude(amount=-CUT_EXTRUDE2_DEPTH, mode=Mode.SUBTRACT)


solid = Compound([part.part, body_2.part])
